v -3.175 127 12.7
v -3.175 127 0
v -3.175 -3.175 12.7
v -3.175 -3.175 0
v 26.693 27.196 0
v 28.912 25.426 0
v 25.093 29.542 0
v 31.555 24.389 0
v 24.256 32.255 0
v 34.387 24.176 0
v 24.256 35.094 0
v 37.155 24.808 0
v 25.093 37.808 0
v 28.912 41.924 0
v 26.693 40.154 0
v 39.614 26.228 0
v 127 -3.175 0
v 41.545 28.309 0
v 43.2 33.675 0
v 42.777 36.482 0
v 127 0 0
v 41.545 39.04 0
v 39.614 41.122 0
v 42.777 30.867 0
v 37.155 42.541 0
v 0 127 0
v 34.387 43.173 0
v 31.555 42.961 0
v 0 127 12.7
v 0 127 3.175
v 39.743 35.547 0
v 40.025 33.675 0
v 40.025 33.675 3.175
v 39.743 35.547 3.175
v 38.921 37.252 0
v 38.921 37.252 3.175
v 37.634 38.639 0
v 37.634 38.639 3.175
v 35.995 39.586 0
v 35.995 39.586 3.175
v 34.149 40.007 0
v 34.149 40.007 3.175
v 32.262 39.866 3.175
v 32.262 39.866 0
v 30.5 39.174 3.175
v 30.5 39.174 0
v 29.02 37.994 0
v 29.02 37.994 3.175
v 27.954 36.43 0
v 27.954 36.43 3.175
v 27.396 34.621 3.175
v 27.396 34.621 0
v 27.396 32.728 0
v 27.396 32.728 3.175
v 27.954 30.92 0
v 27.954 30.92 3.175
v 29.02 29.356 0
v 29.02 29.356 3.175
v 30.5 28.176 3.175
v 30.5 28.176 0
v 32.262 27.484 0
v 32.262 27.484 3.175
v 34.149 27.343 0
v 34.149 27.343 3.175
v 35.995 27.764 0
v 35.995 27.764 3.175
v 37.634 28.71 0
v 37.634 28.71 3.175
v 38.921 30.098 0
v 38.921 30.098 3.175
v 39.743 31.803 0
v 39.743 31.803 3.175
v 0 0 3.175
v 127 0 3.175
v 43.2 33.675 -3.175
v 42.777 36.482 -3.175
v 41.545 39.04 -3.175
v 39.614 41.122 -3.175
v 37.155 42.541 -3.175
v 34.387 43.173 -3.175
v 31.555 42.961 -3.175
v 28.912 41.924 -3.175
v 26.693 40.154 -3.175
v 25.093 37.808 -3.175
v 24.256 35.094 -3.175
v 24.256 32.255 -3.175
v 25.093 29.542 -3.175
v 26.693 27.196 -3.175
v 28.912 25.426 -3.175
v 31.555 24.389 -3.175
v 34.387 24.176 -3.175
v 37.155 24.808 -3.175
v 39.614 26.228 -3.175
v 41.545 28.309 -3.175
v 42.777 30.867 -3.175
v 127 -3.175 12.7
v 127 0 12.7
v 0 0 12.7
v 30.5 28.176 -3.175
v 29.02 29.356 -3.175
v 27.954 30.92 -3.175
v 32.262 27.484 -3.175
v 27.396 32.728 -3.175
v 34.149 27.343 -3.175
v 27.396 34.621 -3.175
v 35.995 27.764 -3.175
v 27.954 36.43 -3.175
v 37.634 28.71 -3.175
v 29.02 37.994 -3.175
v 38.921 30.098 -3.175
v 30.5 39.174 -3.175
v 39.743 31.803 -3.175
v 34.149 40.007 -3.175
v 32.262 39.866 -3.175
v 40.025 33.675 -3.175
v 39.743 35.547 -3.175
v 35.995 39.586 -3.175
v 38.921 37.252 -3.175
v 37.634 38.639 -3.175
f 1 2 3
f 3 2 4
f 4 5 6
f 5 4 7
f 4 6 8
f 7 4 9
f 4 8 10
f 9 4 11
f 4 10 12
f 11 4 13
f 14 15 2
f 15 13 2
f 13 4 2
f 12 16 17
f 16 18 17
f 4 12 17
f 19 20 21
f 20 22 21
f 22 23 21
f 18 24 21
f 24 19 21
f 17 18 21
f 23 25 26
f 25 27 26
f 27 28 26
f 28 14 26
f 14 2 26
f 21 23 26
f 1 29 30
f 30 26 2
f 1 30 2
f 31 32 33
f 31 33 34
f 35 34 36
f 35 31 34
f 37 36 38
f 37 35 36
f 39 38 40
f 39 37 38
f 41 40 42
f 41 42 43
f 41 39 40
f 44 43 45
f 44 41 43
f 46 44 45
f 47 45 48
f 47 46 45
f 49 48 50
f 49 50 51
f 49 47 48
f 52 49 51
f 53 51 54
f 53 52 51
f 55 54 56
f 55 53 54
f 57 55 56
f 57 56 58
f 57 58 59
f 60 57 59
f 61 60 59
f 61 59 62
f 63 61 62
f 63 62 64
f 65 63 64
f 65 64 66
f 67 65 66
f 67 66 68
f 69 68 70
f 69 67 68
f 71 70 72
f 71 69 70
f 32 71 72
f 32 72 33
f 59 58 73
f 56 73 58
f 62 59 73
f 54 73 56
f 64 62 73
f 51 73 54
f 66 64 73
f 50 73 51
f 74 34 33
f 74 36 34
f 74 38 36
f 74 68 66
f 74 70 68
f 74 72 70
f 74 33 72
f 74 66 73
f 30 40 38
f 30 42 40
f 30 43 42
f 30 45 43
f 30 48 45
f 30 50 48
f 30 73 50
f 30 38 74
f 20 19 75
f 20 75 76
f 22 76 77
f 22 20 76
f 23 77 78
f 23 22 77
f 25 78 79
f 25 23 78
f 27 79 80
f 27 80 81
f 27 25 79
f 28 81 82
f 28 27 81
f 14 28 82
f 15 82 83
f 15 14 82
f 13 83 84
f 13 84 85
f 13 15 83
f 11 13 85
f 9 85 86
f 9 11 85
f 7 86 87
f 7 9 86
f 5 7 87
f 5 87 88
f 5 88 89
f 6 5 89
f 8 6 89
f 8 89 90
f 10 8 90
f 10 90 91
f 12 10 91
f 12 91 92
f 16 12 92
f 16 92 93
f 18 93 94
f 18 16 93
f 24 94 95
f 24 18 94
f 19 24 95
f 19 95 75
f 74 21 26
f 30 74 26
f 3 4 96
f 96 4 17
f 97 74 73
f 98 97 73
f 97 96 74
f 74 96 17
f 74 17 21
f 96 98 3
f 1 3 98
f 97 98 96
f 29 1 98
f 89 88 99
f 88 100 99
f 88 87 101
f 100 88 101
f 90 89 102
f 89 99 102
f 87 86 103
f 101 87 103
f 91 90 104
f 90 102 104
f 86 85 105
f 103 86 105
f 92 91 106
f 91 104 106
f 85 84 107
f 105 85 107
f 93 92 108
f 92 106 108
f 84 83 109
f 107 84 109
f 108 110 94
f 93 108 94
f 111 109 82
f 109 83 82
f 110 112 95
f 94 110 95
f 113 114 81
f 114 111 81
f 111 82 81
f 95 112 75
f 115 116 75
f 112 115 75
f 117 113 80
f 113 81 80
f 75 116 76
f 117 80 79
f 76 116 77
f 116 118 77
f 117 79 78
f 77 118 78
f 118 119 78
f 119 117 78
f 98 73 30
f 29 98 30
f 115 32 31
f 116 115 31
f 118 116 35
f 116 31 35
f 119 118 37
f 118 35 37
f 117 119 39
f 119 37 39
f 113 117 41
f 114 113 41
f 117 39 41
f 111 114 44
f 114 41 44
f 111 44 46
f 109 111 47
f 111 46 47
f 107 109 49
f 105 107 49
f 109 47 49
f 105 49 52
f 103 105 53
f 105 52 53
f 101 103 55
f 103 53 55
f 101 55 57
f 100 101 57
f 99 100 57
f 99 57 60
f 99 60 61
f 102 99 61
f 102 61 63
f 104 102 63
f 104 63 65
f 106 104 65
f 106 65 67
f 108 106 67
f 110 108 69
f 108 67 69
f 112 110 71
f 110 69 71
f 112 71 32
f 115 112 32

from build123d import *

# Parameters (mm, degrees)
F0_R     = 9.525
F0_R_2   = 6.35
F1_DEPTH = 3.175
F2_DEPTH = 12.7
F3_DEPTH = 3.175


# Not quite as in the source:
# - a feature names something its author has since deleted; it is built from what else it names


with BuildPart() as f1:
    # F0 (on Top) → F1 (new body)
    with BuildSketch(Plane.XY):
        Polygon((0, 127), (0, 0), (127, 0), align=None)
        with Locations((33.6748659611, 33.6748659611)):
            Circle(F0_R, mode=Mode.SUBTRACT)
        Polygon((127, 0), (0, 0), (0, 127), (-3.175, 127), (-3.175, -3.175), (127, -3.175), align=None)
        with Locations((33.6748659611, 33.6748659611)):
            Circle(F0_R)
        with Locations((33.6748659611, 33.6748659611)):
            Circle(F0_R_2, mode=Mode.SUBTRACT)
    extrude(amount=F1_DEPTH)

    # F0 (on Top) → F2 (join)
    with BuildSketch(Plane.XY):
        Polygon((127, 0), (0, 0), (0, 127), (-3.175, 127), (-3.175, -3.175), (127, -3.175), align=None)
    extrude(amount=F2_DEPTH)

    # F0 (on Top) → F3 (join)
    with BuildSketch(Plane.XY):
        with Locations((33.6748659611, 33.6748659611)):
            Circle(F0_R)
        with Locations((33.6748659611, 33.6748659611)):
            Circle(F0_R_2, mode=Mode.SUBTRACT)
    extrude(amount=-F3_DEPTH)


solid = f1.part
